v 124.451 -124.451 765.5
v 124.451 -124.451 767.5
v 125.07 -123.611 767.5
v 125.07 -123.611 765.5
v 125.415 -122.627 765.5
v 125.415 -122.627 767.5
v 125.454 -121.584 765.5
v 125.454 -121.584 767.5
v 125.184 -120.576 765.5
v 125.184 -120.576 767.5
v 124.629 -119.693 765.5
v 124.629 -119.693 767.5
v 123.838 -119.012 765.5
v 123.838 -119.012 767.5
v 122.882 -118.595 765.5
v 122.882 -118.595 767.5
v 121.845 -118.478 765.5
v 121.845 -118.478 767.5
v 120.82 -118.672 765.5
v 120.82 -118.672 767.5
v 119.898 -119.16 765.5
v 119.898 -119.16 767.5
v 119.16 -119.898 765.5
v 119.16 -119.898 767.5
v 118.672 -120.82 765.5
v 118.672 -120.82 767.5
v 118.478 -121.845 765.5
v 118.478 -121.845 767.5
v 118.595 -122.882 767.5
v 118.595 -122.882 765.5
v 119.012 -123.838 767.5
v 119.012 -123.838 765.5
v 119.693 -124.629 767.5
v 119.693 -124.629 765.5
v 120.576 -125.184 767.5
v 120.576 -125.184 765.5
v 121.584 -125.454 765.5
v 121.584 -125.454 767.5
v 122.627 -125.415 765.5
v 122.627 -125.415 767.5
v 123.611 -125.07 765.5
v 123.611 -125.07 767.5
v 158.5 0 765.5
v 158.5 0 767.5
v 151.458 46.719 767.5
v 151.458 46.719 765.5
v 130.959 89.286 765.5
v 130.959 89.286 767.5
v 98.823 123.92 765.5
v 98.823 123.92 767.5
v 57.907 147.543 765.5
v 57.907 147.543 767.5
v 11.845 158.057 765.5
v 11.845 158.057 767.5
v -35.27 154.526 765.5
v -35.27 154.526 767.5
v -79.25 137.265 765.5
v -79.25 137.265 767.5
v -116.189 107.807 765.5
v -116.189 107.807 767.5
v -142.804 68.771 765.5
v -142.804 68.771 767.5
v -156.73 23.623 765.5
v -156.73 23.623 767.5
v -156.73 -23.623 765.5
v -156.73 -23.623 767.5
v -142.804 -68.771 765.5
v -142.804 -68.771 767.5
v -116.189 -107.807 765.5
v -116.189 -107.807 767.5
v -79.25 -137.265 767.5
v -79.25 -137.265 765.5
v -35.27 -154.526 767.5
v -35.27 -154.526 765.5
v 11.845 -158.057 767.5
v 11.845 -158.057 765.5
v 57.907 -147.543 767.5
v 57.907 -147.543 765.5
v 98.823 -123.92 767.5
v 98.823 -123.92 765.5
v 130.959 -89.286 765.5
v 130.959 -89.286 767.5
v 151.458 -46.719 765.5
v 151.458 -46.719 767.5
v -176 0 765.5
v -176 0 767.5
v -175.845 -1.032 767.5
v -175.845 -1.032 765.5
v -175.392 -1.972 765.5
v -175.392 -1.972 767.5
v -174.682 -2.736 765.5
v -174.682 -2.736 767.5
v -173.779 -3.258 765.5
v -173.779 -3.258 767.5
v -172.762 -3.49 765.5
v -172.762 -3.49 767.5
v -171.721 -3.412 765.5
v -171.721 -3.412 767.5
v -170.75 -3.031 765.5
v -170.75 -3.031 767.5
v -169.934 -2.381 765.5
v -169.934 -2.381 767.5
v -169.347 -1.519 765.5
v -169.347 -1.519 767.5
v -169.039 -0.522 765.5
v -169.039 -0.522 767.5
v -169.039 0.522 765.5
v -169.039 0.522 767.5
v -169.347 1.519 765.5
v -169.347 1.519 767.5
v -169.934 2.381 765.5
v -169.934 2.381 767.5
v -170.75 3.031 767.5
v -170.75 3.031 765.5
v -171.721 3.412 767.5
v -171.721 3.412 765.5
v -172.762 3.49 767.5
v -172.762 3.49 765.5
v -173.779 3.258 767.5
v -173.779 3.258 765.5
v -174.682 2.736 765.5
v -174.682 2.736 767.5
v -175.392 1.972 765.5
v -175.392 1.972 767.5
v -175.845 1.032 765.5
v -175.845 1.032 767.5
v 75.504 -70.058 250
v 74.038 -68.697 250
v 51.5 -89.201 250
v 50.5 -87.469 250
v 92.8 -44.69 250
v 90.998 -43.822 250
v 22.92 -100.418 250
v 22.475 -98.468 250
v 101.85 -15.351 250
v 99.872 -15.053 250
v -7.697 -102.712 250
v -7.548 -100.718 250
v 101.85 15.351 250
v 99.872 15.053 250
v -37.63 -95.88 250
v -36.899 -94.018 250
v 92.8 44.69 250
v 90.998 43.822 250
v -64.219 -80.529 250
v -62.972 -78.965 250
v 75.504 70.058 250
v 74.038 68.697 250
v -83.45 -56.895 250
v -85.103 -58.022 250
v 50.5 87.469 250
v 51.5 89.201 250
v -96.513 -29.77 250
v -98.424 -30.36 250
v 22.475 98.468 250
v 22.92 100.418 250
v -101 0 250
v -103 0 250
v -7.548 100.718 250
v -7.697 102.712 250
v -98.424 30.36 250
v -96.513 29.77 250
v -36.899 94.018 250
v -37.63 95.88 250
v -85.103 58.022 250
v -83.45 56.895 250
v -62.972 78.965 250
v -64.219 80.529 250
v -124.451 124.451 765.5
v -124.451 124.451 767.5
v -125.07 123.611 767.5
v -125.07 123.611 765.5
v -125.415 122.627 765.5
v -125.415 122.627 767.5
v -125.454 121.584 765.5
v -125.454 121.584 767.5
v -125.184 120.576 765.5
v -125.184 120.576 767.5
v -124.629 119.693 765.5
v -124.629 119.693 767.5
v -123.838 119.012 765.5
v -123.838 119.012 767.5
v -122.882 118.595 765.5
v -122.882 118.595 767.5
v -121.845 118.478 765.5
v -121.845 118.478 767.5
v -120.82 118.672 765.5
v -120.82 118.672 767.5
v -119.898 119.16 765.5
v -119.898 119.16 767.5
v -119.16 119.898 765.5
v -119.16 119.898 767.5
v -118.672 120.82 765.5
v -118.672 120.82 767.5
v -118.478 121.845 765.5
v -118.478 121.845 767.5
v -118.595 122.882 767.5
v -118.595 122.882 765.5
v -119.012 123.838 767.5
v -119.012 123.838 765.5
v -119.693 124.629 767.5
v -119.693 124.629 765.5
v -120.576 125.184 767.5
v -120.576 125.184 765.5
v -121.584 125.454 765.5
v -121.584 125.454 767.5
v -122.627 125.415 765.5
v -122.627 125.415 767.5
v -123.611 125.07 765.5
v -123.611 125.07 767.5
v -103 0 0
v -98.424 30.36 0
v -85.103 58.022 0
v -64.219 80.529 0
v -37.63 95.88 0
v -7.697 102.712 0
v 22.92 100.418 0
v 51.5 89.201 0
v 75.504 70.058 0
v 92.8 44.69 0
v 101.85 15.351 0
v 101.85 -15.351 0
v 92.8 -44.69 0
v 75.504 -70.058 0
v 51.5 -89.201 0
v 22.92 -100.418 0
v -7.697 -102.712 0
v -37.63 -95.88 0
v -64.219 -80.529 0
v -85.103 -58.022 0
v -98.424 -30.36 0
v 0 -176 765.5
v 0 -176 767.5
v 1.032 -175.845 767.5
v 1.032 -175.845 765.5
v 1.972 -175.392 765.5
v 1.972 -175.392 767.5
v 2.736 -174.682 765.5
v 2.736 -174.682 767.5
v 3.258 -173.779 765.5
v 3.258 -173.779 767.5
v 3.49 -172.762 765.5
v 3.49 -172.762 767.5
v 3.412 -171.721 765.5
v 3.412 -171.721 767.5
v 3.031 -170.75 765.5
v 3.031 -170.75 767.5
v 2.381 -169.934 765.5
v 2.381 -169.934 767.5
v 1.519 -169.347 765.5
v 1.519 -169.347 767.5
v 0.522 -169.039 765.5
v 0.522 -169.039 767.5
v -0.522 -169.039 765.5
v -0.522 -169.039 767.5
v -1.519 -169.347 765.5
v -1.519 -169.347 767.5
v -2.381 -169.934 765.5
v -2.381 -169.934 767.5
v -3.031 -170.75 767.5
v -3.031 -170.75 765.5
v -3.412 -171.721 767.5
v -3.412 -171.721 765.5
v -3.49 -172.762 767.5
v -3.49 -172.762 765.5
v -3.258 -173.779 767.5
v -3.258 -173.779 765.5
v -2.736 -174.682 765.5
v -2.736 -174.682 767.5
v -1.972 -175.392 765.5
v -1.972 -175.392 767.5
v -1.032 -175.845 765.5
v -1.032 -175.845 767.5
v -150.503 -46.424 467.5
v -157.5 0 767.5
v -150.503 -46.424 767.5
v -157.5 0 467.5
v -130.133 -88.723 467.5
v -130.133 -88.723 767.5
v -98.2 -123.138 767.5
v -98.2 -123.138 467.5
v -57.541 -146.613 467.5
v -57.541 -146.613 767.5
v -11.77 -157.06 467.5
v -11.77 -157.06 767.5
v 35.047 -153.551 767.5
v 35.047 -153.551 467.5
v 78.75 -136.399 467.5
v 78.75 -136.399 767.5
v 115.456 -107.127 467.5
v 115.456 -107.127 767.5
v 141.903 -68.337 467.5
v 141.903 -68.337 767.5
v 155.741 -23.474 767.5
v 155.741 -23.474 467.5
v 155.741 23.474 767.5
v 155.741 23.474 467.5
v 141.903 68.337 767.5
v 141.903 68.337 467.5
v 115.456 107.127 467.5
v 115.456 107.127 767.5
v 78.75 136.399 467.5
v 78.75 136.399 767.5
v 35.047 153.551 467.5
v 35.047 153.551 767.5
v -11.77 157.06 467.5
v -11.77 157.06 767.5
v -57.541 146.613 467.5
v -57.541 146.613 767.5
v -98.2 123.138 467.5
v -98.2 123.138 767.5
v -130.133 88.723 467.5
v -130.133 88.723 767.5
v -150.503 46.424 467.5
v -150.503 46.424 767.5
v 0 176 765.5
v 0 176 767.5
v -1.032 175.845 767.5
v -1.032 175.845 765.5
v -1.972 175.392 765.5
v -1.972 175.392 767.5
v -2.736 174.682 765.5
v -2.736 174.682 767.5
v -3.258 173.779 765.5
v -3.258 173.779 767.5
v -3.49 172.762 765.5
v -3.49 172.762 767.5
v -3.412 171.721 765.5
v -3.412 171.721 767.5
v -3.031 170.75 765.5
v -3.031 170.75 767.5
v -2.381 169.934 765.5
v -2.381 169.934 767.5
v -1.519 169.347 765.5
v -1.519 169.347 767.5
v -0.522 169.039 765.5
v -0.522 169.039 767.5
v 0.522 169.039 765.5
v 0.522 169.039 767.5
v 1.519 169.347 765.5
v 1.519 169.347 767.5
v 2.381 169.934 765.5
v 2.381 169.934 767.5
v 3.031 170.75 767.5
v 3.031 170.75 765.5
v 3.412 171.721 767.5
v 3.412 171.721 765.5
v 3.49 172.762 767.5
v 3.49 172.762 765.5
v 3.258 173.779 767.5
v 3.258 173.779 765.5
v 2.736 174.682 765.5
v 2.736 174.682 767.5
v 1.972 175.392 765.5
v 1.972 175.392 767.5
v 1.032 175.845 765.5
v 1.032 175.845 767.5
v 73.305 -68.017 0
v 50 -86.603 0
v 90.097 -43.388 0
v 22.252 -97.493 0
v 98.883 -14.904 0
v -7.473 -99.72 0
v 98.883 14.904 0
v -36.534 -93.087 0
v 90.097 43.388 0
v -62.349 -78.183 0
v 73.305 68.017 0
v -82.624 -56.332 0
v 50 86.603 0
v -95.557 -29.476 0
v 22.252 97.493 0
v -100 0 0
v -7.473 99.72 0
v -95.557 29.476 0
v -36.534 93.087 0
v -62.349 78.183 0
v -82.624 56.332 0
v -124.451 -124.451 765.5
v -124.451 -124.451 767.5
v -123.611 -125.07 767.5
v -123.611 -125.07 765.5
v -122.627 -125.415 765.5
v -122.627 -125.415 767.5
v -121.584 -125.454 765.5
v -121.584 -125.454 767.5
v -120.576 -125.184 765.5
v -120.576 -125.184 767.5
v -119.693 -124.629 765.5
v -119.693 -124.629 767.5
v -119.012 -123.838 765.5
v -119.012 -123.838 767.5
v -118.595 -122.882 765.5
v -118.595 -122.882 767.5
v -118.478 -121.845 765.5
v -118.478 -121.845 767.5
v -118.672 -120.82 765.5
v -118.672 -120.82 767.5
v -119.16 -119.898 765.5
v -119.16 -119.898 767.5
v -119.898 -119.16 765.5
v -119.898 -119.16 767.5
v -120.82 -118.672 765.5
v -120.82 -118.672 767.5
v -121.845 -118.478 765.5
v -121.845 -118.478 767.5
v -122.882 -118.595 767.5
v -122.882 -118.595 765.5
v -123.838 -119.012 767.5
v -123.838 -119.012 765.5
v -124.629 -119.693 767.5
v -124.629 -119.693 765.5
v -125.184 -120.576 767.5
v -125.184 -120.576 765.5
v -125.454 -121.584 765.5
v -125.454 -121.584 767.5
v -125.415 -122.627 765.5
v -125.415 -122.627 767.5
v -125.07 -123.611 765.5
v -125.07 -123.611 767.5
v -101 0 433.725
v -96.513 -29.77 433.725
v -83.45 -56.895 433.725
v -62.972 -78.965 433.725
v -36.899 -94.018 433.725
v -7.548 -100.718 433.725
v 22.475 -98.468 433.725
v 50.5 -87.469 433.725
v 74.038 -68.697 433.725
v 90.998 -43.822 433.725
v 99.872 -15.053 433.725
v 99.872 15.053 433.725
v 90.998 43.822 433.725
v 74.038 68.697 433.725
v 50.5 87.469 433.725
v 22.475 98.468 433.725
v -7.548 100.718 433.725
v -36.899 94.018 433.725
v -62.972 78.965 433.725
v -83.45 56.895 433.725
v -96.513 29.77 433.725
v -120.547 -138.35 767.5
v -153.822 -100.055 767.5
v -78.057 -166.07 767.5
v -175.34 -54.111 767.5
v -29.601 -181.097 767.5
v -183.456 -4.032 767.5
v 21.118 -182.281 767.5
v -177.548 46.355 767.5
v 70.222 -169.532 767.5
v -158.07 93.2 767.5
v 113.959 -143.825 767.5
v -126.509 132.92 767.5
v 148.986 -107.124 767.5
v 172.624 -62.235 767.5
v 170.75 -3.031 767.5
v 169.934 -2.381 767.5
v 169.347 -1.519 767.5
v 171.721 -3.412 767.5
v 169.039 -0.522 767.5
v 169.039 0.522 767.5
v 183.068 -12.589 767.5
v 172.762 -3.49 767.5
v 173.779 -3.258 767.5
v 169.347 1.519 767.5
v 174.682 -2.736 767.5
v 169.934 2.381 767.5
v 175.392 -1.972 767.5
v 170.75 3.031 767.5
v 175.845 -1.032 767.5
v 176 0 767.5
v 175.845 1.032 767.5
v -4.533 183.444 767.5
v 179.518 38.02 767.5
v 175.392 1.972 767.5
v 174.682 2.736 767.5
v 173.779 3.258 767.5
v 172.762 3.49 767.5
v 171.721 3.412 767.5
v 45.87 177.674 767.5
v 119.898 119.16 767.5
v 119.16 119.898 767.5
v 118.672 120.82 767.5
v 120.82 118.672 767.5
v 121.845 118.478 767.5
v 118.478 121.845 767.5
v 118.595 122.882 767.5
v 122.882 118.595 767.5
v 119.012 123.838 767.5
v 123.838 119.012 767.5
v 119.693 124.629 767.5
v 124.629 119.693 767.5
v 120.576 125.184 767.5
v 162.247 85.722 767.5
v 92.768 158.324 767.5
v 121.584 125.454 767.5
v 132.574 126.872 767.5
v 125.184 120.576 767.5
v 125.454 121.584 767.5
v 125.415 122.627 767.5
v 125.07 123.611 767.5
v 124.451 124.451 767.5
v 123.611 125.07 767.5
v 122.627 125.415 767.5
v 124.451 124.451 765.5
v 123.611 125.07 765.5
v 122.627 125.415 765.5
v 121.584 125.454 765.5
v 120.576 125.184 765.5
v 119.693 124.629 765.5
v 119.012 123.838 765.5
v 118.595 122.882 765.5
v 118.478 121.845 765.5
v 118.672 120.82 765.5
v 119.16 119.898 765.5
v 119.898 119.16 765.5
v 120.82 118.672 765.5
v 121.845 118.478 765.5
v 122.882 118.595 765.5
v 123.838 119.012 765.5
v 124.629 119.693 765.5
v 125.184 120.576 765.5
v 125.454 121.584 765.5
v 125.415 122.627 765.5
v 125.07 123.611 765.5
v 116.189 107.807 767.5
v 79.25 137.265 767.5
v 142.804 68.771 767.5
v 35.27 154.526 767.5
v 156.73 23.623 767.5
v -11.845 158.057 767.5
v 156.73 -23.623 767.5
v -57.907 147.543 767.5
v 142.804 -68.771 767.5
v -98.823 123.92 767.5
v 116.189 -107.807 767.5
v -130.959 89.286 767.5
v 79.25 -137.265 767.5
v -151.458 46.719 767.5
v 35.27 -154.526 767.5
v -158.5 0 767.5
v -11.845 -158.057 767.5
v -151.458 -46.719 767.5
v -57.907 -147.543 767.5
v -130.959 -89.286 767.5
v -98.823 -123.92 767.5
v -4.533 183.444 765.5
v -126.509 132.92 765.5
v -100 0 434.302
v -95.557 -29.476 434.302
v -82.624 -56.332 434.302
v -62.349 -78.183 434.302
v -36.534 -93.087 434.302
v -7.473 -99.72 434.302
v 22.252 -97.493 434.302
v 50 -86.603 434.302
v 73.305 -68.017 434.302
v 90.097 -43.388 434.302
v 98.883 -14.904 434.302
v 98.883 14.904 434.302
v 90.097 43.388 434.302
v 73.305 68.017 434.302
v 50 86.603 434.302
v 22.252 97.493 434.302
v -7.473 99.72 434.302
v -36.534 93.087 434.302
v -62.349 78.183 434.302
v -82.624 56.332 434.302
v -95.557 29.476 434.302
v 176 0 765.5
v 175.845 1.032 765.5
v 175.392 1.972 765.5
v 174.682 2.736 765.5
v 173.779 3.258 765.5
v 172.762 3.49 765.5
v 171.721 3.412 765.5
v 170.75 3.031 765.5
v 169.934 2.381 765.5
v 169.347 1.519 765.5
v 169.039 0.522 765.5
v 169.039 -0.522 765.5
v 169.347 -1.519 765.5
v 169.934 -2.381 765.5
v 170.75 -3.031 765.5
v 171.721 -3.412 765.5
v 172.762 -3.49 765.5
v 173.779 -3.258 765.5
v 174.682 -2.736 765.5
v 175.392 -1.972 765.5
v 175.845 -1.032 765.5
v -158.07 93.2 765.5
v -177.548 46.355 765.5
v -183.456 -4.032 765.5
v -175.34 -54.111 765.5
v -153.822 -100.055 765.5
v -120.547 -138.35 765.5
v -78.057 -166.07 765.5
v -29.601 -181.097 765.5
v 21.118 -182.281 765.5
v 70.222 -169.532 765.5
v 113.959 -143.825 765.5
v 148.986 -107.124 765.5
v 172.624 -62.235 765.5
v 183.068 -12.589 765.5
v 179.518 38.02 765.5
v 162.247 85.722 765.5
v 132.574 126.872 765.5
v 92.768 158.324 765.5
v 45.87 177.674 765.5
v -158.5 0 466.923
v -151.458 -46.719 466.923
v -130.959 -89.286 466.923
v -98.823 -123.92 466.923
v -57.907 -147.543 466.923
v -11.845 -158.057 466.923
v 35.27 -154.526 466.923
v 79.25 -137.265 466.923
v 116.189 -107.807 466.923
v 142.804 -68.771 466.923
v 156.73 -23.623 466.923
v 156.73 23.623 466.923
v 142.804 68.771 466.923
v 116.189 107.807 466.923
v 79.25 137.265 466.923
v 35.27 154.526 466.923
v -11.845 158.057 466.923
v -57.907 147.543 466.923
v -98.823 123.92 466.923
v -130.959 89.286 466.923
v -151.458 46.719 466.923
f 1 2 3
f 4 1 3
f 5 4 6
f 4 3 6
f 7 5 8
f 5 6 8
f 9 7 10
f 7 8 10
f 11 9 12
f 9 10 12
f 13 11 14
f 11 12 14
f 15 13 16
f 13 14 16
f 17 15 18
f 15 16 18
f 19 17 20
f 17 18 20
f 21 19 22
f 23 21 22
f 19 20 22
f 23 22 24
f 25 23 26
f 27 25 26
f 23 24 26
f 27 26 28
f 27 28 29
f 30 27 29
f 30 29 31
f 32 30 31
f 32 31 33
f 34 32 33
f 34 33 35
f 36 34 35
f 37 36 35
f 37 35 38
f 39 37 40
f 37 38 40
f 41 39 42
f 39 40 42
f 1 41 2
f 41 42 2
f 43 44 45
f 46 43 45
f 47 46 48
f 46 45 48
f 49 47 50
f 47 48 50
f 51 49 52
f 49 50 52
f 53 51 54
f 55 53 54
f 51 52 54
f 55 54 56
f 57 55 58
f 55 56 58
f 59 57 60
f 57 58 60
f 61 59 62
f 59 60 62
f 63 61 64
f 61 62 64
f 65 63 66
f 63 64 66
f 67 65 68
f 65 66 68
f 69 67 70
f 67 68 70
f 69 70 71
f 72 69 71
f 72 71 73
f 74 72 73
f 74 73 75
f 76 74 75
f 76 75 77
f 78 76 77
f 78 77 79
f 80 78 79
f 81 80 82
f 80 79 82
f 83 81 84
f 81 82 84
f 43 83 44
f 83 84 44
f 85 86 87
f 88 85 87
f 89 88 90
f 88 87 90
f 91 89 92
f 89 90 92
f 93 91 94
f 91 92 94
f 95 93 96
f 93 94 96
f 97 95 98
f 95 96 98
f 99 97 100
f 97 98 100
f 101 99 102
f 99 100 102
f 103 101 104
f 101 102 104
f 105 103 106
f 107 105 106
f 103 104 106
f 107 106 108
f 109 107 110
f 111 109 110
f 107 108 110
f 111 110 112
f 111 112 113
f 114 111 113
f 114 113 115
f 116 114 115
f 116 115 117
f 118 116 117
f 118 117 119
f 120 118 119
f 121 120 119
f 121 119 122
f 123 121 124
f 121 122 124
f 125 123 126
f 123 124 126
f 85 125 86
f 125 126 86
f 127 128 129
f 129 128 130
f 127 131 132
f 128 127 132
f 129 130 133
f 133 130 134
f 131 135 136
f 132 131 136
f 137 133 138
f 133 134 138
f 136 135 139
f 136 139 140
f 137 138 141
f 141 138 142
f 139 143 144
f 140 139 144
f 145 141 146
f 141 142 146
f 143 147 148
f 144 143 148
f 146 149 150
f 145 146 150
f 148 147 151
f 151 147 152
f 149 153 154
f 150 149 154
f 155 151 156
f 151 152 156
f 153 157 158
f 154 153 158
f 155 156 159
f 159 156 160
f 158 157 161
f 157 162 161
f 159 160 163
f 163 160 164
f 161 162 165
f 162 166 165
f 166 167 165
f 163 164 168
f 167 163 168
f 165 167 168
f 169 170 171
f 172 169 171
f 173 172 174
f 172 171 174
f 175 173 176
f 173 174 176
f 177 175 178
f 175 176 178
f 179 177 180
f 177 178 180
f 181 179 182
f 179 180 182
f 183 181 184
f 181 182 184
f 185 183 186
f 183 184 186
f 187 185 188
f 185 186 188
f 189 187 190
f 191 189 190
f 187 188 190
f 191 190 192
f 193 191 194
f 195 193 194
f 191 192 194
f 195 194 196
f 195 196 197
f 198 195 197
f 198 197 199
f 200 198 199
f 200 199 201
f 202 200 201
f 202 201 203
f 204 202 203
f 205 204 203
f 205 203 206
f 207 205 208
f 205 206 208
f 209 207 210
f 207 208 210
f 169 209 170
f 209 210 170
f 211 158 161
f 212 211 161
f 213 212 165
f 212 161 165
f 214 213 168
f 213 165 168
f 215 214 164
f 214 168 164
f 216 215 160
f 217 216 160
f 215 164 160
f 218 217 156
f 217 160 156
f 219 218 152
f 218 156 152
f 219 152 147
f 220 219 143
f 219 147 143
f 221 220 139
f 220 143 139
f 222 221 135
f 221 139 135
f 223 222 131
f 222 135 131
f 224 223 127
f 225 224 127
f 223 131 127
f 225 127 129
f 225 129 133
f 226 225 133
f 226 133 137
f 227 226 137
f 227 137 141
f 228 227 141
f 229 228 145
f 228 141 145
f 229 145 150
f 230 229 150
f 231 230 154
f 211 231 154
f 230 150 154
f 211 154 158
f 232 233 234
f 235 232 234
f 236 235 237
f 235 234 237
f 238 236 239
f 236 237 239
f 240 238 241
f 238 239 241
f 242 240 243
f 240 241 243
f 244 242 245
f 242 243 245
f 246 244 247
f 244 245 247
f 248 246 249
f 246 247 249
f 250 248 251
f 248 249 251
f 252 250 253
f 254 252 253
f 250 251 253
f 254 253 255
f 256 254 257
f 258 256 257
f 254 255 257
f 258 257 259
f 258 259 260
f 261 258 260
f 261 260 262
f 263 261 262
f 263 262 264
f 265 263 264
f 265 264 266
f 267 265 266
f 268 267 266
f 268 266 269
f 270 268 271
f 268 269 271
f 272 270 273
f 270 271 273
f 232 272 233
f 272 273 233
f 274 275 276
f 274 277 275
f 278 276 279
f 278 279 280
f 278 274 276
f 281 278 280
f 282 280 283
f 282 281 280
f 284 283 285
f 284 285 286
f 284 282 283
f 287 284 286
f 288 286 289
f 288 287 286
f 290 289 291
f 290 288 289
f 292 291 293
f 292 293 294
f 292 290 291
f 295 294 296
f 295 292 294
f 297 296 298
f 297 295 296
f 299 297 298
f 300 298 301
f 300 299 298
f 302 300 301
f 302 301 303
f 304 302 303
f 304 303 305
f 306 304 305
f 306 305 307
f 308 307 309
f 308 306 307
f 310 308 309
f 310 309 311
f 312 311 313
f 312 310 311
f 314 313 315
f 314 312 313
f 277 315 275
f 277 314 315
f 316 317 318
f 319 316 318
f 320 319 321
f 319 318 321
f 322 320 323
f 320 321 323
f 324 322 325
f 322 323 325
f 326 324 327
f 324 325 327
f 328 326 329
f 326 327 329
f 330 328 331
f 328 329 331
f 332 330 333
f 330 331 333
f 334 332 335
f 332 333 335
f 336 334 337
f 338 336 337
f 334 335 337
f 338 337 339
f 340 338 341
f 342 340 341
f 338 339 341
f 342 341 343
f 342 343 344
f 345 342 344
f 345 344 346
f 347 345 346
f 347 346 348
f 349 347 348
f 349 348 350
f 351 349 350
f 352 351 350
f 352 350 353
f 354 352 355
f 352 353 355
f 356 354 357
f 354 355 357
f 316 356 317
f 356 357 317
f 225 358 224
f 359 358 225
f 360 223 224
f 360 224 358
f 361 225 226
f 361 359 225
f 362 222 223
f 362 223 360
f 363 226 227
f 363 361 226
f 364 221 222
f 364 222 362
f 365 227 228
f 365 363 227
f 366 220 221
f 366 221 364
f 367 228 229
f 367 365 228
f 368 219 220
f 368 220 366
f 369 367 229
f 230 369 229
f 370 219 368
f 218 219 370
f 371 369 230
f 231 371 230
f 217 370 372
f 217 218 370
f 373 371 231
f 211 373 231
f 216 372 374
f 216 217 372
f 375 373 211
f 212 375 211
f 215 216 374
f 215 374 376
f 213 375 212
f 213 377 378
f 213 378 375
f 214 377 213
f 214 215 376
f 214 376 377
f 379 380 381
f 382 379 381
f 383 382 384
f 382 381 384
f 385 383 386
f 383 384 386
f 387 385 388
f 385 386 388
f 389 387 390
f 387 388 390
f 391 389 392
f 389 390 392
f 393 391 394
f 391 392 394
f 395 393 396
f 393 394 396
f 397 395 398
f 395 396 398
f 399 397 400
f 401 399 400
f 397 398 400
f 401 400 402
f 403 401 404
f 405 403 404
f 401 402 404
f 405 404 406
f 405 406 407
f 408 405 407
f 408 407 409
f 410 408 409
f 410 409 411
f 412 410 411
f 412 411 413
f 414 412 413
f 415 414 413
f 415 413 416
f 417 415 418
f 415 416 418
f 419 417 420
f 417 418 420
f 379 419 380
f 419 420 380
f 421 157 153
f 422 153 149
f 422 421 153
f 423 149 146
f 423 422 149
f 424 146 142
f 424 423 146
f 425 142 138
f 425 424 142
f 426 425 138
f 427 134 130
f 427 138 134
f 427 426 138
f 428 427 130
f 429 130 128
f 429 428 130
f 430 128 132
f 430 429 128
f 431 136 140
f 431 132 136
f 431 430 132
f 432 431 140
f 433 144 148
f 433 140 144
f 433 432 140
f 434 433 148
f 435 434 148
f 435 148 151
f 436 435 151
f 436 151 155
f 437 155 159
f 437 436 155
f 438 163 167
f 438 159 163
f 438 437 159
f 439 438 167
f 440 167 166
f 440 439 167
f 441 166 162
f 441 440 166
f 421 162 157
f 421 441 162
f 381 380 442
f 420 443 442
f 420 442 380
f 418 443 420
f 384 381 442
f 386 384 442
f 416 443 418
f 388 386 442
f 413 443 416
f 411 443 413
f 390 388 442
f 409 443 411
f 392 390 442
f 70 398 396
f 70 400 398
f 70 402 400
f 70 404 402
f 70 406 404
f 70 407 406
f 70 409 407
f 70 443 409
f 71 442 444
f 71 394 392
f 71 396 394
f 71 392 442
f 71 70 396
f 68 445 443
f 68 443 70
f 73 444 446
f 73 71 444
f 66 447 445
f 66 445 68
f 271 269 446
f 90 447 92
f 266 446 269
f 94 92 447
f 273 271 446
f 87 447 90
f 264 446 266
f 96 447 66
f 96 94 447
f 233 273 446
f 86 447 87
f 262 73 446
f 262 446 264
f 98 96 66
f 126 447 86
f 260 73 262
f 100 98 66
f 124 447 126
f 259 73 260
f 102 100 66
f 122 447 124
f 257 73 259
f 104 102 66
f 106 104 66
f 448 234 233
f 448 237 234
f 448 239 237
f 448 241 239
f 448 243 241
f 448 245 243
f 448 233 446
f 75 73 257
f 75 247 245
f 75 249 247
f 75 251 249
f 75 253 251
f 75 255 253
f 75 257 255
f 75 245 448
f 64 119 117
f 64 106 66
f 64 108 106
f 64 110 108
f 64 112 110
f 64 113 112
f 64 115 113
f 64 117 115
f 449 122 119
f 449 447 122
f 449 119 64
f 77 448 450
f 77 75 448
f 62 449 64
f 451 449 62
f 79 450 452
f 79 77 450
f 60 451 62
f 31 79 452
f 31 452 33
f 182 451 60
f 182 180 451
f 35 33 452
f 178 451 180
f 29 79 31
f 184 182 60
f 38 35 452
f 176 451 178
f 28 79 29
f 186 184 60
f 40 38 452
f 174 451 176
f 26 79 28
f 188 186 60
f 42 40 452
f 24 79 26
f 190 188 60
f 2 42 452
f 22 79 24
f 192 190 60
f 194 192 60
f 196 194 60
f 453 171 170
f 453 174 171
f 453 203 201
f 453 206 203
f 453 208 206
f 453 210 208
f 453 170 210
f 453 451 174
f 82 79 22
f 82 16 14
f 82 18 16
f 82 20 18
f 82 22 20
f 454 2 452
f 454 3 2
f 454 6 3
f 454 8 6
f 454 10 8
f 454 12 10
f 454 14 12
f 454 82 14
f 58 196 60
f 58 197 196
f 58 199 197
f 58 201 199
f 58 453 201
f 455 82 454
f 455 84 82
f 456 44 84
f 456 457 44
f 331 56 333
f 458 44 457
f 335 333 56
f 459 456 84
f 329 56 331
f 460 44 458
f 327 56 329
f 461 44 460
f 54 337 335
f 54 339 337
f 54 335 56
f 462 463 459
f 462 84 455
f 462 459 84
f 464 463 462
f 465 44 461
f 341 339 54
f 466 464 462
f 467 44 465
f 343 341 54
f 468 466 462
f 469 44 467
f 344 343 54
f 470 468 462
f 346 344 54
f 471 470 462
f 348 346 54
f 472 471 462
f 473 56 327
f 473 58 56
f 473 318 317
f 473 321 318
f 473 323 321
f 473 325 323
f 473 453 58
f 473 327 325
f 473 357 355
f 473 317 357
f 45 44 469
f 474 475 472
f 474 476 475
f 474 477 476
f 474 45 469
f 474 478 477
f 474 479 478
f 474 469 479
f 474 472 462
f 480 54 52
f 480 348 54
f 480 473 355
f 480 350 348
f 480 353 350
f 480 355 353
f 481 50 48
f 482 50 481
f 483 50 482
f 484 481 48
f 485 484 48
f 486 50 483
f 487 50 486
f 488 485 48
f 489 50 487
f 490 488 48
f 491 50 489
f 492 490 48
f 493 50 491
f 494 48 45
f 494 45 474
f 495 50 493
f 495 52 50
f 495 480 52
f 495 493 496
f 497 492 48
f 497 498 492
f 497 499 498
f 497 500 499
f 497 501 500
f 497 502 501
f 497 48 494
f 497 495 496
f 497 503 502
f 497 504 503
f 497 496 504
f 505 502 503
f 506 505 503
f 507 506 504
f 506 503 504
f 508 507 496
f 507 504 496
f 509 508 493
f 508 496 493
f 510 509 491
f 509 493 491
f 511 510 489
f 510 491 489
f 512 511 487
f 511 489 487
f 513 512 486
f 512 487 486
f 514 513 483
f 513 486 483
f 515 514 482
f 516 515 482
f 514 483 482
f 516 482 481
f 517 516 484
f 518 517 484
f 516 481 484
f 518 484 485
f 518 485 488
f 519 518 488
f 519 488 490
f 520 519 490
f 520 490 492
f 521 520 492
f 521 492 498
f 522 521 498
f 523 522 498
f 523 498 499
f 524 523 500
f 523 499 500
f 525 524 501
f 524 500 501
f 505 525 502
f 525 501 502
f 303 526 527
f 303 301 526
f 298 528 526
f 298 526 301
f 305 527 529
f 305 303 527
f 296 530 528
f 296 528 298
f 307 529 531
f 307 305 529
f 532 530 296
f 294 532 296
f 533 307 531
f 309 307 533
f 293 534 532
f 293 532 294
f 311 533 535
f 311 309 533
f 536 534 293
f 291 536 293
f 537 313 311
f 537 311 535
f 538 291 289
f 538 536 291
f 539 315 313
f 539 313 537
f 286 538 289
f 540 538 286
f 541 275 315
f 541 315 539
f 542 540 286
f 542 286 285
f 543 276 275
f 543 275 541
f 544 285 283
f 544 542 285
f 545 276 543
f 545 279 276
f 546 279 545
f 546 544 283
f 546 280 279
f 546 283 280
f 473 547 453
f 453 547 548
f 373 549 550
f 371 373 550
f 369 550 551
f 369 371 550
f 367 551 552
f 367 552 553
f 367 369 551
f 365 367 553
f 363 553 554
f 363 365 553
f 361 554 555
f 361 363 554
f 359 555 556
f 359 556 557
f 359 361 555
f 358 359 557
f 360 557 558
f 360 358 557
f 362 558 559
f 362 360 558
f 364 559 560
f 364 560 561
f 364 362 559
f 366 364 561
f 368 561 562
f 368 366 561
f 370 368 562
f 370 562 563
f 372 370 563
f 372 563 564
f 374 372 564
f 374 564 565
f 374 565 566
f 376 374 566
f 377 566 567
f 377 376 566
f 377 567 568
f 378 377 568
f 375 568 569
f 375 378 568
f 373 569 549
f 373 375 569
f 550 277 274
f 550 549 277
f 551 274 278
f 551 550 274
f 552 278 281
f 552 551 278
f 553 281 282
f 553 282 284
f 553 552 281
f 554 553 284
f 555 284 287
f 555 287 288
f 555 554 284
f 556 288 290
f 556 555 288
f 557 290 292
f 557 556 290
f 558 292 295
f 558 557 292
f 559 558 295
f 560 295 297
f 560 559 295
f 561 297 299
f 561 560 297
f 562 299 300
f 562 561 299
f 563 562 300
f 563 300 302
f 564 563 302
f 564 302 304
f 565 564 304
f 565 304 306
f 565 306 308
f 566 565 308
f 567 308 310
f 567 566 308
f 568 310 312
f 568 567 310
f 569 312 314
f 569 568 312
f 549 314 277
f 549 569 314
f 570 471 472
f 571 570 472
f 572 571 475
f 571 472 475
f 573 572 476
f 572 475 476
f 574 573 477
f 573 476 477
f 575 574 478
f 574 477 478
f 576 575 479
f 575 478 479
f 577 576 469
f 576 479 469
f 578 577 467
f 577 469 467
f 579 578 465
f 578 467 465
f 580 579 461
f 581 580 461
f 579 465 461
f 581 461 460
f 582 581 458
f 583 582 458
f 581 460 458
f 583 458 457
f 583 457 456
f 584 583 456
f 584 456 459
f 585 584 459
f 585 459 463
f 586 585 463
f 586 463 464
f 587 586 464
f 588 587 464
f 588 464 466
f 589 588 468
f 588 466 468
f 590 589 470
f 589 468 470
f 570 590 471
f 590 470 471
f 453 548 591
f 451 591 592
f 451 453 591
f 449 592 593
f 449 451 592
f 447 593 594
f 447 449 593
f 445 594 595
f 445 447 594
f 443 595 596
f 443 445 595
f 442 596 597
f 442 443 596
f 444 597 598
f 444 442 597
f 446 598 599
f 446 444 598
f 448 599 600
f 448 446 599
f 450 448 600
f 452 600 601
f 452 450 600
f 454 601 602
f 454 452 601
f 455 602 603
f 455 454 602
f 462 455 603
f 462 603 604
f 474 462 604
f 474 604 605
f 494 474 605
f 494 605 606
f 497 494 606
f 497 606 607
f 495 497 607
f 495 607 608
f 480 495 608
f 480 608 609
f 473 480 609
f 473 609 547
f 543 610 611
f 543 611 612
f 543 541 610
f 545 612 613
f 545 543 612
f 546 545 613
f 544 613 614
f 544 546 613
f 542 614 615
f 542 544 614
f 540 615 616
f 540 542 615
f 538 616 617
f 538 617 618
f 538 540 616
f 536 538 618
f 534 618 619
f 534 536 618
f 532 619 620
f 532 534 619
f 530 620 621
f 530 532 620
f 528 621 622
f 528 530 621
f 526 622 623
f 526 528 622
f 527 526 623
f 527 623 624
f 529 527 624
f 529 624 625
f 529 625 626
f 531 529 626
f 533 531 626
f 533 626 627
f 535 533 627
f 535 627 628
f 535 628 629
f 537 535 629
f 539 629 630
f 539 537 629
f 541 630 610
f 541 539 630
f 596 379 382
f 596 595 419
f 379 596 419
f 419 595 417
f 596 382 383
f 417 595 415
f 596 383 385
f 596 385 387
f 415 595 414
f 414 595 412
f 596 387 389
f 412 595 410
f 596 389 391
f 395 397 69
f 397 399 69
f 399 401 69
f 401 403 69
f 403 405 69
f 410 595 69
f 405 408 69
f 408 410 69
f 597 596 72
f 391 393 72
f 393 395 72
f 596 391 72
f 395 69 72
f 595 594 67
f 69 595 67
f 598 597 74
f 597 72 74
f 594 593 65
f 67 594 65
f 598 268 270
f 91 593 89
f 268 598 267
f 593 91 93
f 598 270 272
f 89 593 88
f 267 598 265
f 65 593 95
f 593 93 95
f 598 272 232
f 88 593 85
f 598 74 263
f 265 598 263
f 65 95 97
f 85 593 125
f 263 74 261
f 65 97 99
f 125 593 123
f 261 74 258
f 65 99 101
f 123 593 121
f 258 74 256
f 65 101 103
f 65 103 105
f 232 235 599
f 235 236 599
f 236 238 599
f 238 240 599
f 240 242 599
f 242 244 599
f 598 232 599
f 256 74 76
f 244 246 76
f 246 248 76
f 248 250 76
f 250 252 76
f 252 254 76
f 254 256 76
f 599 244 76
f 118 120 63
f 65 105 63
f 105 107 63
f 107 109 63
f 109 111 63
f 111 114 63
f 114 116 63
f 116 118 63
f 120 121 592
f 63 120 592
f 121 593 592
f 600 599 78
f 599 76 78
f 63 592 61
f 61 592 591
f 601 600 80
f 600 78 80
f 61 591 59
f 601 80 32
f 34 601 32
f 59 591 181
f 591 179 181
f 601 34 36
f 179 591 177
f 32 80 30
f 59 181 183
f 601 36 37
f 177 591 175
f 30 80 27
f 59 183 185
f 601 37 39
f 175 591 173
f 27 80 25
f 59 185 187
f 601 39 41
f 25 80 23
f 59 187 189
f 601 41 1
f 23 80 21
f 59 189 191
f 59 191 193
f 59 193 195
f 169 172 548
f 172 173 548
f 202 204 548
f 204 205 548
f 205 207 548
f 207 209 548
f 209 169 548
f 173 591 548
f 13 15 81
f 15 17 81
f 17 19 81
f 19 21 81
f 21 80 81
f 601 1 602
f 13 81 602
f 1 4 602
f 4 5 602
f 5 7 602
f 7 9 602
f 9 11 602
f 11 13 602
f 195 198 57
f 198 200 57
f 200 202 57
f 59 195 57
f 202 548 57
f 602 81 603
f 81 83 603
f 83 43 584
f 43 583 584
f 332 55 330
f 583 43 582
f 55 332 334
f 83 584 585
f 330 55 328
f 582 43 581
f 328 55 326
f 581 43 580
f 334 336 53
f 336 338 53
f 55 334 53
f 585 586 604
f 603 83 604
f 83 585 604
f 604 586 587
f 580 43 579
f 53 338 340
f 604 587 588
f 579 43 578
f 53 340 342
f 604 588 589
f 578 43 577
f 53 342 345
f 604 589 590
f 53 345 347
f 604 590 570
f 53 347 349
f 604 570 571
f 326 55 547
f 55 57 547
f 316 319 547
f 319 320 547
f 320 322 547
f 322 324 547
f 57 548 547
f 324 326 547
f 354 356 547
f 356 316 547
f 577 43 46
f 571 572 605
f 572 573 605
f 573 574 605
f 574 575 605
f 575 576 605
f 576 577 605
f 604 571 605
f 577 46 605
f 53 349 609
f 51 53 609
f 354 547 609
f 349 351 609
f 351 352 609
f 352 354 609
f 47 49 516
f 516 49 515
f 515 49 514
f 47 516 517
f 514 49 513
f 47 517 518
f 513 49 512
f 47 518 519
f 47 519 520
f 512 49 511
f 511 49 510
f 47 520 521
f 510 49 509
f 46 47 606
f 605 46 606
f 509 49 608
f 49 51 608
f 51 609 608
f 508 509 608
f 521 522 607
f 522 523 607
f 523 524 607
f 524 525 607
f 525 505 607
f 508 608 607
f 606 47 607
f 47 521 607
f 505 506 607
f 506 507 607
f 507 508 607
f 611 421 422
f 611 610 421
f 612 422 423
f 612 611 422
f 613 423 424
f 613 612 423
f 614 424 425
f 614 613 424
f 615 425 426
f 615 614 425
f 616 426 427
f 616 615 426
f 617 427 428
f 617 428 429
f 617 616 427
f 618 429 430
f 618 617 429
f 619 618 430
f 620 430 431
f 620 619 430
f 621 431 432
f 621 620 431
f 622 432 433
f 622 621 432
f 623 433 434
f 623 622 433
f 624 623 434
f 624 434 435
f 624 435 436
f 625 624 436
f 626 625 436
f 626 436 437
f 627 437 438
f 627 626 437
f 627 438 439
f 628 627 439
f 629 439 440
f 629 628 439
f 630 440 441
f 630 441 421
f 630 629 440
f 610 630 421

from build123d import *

# Parameters (mm, degrees)
EXTRUDE_THIN1_START = -250
SKETCH2_R           = 103
SKETCH2_R_2         = 101
EXTRUDE_THIN1_DEPTH = 250
SKETCH3_R           = 183.5
SKETCH3_R_2         = 158.5
EXTRUDE1_DEPTH      = 2
SKETCH4_R           = 3.5
EXTRUDE2_DEPTH      = 2
CIRPATTERN1_COUNT   = 8
EXTRUDE3_DEPTH      = 10


with BuildPart() as part:
    # Sketch1 → Revolve-Thin1 (revolve)
    with BuildSketch(Plane(origin=(0, 0, 0), x_dir=(0, 0, -1), z_dir=(1, 0, 0)), mode=Mode.PRIVATE) as revolve_thin1_sk:
        Polygon((-767.5, 157.5), (-467.5, 157.5), (-434.302359522, 100), (0, 100), (0, 101), (-433.725009252, 101), (-466.922649731, 158.5), (-767.5, 158.5), align=None)
    revolve(revolve_thin1_sk.sketch.rotate(Axis((0, 0, 0), (0, 0, 1)), 90), axis=Axis((0, 0, 0), (0, 0, 1)))

    # Sketch2 → Extrude-Thin1 (add)
    with BuildSketch(Plane(origin=(0, 0, 0), x_dir=(-1, 0, 0), z_dir=(0, 0, -1)).offset(EXTRUDE_THIN1_START)):
        Circle(SKETCH2_R)
        Circle(SKETCH2_R_2, mode=Mode.SUBTRACT)
    extrude(amount=EXTRUDE_THIN1_DEPTH)


with BuildPart() as body_2:
    # Sketch3 → Extrude1 (new body)
    with BuildSketch(Plane.XY.offset(767.5)):
        Circle(SKETCH3_R)
        Circle(SKETCH3_R_2, mode=Mode.SUBTRACT)
    extrude(amount=-EXTRUDE1_DEPTH)

    # Sketch4 → Extrude2 (cut)
    with BuildSketch(Plane.XY.offset(767.5)):
        with Locations((172.5, 0)):
            Circle(SKETCH4_R)
    extrude2 = extrude(amount=-EXTRUDE2_DEPTH, mode=Mode.SUBTRACT)

    # CirPattern1: Extrude2 ×8 about axis
    cirpattern1_axis = Axis((0, 0, 0), (0, 0, 1))
    for i in range(1, CIRPATTERN1_COUNT):
        add(extrude2.rotate(cirpattern1_axis, i * 360 / CIRPATTERN1_COUNT), mode=Mode.SUBTRACT)

    # Sketch5 → Extrude3 (cut)
    with BuildSketch(Plane(origin=(0, 0, 765.5), x_dir=(-1, 0, 0), z_dir=(0, 0, -1))):
        with BuildLine():
            Line((4.53315254, 183.443998343), (126.509072295, 132.919918098))
            ThreePointArc((126.509072295, 132.919918098), (70.222409839, 169.531894216), (4.53315254, 183.443998343))
        make_face()
    extrude(amount=-EXTRUDE3_DEPTH, mode=Mode.SUBTRACT)


solid = Compound([part.part, body_2.part])
